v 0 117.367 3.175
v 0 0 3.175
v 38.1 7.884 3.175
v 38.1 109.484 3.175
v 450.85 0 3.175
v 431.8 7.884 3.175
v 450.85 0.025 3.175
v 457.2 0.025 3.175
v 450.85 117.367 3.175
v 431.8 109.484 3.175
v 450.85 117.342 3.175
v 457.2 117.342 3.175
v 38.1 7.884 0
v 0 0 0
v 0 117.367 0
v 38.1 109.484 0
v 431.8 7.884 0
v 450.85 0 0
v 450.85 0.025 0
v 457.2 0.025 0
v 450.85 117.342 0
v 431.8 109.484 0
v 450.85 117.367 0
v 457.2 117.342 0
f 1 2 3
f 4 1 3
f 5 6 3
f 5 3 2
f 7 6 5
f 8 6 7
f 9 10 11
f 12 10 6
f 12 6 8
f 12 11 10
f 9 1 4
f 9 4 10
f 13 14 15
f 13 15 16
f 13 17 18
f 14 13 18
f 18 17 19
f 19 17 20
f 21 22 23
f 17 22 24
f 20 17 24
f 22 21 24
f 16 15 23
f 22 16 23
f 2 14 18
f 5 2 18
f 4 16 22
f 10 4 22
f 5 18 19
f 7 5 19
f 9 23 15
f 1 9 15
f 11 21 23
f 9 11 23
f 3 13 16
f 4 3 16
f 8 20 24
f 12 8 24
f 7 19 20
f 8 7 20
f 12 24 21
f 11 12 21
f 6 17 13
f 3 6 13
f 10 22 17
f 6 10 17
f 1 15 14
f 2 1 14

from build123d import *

# Parameters (mm, degrees)
BOSS_EXTRUDE1_DEPTH = 3.175


with BuildPart() as part:
    # Sketch1 → Boss-Extrude1 (new body)
    with BuildSketch(Plane.XY):
        Polygon((38.1, 58.683525), (0, 58.683525), (0, 0), (450.85, 0), (450.85, 0.0254), (457.2, 0.0254), (457.2, 58.683525), (431.8, 58.683525), (431.8, 7.883525), (38.1, 7.883525), align=None)
        Polygon((0, 117.36705), (0, 58.683525), (38.1, 58.683525), (38.1, 109.483525), (431.8, 109.483525), (431.8, 58.683525), (457.2, 58.683525), (457.2, 117.34165), (450.85, 117.34165), (450.85, 117.36705), align=None)
    extrude(amount=BOSS_EXTRUDE1_DEPTH)


solid = part.part
